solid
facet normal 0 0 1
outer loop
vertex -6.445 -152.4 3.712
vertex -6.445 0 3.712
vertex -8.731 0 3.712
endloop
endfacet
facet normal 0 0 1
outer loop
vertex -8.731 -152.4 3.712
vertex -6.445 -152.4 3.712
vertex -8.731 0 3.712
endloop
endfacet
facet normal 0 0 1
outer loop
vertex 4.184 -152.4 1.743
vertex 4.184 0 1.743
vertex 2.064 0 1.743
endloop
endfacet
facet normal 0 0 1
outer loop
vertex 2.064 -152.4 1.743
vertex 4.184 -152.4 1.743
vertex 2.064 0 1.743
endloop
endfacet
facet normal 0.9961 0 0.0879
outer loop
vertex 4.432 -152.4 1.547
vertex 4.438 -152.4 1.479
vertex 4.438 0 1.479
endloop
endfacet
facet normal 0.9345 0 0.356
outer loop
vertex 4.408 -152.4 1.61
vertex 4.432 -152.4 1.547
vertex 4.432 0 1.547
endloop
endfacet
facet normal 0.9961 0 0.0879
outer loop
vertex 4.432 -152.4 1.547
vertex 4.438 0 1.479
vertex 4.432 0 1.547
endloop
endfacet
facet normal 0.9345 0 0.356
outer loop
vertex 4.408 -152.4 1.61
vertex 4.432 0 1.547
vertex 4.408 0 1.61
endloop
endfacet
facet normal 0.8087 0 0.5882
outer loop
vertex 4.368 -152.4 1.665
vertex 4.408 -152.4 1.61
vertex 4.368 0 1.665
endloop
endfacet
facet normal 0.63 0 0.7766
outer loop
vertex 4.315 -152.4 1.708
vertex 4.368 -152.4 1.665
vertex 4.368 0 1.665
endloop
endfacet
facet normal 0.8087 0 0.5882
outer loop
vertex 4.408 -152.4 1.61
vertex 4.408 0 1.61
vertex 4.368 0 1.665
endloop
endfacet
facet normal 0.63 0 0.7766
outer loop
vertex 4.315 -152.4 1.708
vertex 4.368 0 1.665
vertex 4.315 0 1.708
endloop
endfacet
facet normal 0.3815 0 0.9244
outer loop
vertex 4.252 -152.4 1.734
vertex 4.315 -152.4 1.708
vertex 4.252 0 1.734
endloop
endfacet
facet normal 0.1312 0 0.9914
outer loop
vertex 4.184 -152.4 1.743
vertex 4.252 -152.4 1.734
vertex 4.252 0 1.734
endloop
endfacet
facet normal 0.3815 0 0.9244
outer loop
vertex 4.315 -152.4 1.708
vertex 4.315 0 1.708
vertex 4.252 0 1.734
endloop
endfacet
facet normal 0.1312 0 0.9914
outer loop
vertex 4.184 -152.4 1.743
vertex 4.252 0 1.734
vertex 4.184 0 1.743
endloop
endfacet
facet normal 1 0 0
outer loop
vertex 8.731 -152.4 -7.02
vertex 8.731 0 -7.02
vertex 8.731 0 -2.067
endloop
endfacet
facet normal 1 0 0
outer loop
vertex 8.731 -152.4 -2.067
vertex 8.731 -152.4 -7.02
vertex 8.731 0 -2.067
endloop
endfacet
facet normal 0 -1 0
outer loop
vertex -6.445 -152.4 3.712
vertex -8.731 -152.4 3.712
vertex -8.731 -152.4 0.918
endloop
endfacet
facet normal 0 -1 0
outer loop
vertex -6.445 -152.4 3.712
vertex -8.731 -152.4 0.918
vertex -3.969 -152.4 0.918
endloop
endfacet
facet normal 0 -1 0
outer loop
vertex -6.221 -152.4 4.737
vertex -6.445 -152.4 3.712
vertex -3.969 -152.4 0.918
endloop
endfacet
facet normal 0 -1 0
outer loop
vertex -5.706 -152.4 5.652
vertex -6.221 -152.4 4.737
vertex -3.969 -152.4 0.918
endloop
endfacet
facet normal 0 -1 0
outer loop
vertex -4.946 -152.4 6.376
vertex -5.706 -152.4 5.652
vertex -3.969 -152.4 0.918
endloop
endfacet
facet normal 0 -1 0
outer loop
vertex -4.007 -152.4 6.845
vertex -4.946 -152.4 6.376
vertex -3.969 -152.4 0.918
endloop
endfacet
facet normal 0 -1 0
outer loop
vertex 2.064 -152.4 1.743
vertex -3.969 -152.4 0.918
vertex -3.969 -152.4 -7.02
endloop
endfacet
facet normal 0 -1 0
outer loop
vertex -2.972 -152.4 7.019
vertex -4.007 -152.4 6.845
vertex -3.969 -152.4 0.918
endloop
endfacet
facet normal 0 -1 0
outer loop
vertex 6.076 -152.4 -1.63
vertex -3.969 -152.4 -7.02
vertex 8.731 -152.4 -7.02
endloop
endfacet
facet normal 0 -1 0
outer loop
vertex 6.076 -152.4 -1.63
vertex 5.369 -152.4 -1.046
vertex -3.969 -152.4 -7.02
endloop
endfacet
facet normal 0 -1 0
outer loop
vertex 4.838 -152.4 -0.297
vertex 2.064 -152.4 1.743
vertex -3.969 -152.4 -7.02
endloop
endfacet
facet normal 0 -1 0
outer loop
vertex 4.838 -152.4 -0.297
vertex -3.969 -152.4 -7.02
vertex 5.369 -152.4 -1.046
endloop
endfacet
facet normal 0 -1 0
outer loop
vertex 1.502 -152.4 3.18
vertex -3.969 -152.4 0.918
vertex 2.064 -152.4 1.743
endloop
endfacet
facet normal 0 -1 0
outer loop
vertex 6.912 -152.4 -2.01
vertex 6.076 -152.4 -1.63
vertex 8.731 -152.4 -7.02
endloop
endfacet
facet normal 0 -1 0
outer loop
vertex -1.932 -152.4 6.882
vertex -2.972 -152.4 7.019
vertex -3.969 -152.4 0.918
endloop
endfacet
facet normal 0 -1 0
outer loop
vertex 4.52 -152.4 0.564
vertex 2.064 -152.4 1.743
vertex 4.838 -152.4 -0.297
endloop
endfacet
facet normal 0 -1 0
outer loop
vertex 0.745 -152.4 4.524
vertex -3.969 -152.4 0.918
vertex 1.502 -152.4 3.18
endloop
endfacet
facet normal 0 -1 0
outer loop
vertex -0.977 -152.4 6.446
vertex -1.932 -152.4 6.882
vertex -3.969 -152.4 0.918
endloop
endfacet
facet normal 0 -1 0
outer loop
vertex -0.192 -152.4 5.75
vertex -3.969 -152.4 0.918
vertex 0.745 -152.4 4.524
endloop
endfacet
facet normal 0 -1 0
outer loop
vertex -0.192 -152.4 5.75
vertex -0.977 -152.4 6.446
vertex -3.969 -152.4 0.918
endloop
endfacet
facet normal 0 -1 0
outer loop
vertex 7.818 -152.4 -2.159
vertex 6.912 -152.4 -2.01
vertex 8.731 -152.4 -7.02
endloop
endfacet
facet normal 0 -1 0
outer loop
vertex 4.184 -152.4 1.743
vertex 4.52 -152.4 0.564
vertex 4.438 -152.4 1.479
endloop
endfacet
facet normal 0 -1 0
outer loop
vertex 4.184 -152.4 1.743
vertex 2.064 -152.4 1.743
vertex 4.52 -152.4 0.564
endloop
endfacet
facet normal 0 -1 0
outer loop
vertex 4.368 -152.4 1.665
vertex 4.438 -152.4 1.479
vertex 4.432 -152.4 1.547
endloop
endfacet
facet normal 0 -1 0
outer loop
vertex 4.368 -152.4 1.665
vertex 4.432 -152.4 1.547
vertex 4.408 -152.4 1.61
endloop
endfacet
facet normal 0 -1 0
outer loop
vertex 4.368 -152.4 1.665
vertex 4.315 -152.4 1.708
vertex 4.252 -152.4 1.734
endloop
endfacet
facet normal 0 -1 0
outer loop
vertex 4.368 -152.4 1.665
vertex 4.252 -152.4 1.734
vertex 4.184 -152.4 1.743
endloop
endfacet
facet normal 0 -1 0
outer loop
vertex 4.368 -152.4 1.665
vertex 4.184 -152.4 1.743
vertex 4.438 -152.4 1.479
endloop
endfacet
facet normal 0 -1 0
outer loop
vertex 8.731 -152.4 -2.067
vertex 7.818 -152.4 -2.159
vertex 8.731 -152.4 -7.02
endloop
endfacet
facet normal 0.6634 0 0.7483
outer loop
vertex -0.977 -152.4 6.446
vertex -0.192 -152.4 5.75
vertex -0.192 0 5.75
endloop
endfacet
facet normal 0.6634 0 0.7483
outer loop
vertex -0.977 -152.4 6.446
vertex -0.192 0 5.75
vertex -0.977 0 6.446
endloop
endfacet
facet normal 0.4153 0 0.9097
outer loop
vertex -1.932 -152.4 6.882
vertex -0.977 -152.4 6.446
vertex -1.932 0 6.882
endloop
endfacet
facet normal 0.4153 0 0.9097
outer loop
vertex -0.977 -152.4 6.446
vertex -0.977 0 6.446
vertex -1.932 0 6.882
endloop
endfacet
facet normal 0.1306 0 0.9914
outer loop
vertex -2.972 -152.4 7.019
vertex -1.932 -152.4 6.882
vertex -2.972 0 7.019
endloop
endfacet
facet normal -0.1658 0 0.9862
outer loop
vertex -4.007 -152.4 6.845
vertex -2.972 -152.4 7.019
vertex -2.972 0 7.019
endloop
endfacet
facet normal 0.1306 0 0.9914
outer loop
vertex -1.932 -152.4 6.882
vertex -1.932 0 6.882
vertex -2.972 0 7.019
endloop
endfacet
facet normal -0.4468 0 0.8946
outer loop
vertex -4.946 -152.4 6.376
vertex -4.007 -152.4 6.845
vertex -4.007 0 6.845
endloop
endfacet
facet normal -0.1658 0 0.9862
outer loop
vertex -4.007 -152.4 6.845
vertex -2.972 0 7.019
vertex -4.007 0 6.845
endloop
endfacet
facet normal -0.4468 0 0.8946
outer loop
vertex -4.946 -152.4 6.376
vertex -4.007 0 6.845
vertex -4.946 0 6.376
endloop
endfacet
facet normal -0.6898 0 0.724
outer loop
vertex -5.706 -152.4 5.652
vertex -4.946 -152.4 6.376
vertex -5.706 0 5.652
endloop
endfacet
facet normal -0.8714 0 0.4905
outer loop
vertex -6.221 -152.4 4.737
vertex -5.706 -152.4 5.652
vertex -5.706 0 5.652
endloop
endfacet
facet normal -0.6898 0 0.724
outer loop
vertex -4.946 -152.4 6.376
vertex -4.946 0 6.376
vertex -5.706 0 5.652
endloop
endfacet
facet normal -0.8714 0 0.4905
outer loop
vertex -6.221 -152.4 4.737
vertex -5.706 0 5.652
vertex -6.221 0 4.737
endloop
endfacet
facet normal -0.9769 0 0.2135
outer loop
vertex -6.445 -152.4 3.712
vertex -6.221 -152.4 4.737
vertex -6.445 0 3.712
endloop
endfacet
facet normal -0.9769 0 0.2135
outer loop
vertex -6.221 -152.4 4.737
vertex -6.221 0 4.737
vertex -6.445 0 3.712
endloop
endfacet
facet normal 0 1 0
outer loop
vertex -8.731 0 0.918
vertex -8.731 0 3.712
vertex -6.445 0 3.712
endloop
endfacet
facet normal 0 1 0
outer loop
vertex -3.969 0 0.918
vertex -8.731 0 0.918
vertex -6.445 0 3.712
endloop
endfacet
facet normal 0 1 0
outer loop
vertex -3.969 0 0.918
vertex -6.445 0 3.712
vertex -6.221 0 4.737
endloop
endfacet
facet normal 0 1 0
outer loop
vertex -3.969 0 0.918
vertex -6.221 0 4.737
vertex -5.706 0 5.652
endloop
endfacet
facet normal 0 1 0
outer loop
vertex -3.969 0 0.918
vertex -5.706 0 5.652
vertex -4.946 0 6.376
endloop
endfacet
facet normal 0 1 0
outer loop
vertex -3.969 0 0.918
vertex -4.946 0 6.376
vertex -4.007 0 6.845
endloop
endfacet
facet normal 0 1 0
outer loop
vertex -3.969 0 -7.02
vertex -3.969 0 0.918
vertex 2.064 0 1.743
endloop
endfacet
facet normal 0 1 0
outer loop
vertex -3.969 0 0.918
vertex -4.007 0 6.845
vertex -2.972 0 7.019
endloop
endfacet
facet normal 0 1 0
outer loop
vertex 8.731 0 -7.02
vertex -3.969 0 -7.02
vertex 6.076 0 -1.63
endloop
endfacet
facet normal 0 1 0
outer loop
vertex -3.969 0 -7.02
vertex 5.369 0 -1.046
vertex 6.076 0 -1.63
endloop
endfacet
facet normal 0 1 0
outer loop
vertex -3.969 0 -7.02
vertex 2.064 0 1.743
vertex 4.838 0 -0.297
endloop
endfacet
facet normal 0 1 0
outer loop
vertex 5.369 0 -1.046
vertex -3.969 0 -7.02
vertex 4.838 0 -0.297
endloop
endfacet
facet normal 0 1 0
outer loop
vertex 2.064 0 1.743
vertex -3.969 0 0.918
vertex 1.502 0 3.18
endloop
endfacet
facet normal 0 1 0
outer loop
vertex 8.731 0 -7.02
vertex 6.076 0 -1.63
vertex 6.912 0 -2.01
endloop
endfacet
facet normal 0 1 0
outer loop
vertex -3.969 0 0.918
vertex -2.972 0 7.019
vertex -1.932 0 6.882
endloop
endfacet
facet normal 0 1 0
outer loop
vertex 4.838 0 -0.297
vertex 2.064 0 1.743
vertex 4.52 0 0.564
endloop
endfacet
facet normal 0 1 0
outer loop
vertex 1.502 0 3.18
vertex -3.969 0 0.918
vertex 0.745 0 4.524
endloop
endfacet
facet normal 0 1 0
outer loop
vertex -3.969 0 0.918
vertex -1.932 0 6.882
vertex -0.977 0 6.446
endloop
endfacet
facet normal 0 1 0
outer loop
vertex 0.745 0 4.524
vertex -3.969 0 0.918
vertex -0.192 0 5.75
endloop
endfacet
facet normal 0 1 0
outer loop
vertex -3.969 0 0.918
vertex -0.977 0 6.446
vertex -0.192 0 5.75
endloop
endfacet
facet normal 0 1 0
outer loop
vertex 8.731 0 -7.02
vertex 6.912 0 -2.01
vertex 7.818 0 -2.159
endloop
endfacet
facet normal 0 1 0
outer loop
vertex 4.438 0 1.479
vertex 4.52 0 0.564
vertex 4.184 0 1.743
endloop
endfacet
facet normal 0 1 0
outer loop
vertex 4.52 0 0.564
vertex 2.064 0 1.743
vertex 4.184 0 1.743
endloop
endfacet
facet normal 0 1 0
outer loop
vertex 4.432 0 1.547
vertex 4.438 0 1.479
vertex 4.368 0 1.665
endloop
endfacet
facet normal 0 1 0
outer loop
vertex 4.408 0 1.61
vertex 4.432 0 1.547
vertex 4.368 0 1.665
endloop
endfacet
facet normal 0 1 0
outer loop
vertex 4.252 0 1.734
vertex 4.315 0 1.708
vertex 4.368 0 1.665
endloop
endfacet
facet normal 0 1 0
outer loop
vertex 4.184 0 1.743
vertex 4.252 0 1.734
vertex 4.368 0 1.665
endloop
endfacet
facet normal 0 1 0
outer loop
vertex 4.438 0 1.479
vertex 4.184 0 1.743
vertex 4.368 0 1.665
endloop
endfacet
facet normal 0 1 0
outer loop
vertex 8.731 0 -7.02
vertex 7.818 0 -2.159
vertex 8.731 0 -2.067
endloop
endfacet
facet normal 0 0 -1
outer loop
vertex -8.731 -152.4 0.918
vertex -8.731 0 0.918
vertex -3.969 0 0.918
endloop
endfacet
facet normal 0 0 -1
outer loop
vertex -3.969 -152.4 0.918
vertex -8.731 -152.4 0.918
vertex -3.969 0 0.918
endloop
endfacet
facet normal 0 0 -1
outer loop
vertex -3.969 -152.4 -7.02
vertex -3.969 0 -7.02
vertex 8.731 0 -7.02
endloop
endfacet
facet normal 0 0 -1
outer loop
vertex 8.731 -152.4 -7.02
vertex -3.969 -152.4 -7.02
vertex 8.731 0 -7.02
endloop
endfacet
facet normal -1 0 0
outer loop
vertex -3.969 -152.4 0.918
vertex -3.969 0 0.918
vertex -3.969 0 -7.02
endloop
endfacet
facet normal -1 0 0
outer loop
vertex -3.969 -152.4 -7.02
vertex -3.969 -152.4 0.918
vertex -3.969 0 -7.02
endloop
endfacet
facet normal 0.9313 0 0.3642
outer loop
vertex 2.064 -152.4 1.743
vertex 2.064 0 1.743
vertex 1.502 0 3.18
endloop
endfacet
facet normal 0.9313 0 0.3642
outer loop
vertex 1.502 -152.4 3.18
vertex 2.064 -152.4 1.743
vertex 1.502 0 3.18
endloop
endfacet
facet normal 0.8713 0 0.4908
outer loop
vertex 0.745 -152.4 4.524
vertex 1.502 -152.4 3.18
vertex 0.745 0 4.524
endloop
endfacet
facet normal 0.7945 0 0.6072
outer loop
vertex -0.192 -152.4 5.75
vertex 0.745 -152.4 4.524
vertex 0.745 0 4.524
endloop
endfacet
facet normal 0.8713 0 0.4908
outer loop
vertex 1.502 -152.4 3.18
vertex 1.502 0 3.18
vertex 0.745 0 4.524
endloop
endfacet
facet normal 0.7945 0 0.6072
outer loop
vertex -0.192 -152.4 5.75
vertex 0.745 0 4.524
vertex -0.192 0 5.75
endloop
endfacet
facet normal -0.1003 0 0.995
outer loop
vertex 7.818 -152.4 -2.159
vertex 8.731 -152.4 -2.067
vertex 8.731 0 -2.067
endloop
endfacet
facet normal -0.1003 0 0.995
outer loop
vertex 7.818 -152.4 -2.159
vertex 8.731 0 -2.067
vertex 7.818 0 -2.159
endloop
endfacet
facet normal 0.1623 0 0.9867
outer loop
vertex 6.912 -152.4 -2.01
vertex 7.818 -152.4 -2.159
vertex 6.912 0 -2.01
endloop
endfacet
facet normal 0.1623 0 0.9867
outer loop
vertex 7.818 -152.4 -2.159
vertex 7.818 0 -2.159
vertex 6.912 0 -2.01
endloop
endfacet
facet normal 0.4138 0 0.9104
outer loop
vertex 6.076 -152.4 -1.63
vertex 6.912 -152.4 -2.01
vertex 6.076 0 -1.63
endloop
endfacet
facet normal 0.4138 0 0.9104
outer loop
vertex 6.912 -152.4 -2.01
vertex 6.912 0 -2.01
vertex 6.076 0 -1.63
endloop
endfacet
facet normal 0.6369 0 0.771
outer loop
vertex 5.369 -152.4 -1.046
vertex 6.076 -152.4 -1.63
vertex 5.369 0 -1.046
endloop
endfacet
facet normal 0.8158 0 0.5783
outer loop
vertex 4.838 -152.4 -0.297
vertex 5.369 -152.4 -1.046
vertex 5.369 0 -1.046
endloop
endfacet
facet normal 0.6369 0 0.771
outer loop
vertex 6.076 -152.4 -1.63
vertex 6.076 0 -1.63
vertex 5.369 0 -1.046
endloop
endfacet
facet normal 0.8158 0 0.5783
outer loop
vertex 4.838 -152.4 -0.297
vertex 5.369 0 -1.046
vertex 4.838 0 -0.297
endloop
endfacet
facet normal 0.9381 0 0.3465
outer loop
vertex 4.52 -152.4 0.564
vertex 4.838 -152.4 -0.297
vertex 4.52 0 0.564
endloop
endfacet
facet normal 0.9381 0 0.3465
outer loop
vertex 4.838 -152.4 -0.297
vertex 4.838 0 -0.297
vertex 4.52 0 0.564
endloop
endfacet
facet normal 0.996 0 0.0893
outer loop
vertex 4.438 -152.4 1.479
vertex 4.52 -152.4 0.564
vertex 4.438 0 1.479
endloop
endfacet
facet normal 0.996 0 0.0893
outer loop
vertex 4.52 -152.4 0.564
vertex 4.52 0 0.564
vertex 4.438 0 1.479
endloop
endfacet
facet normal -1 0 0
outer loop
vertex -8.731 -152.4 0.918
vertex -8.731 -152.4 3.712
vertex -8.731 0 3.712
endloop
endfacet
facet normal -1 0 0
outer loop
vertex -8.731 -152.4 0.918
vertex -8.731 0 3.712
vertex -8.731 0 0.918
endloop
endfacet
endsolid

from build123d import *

# Parameters (mm, degrees)
F1_DEPTH = 152.4


# Not quite as in the source:
# - ends of sketch curves that miss each other by under 0.0002 mm in the source are joined


with BuildPart() as f1:
    # F0 (on Front) → F1 (new body)
    with BuildSketch(Plane.XZ):
        with BuildLine():
            Line((-8.73125, 3.7119814), (-8.73125, 0.9179814))
            Line((-8.73125, 0.9179814), (-3.96875, 0.9179814))
            Line((-3.96875, 0.9179814), (-3.96875, -7.0195186))
            Line((-3.96875, -7.0195186), (8.73125, -7.0195186))
            Line((8.73125, -7.0195186), (8.73125, -2.0665186))
            ThreePointArc((8.73125, -2.0665186), (5.7032908876, -1.3612616552), (4.438258034, 1.4787376653))
            ThreePointArc((4.438258034, 1.4787376653), (4.3678620463, 1.6652468114), (4.1844976, 1.7434814))
            Line((4.1844976, 1.7434814), (2.06375, 1.7434814))
            ThreePointArc((2.06375, 1.7434814), (1.1469309524, 3.8652258573), (-0.1916191114, 5.7495426677))
            ThreePointArc((-0.1916191114, 5.7495426677), (-4.0073604602, 6.8451953761), (-6.4452349512, 3.7119803958))
            Line((-6.4452349512, 3.7119803958), (-8.73125, 3.7119814))
        make_face()
    extrude(amount=F1_DEPTH)


solid = f1.part
